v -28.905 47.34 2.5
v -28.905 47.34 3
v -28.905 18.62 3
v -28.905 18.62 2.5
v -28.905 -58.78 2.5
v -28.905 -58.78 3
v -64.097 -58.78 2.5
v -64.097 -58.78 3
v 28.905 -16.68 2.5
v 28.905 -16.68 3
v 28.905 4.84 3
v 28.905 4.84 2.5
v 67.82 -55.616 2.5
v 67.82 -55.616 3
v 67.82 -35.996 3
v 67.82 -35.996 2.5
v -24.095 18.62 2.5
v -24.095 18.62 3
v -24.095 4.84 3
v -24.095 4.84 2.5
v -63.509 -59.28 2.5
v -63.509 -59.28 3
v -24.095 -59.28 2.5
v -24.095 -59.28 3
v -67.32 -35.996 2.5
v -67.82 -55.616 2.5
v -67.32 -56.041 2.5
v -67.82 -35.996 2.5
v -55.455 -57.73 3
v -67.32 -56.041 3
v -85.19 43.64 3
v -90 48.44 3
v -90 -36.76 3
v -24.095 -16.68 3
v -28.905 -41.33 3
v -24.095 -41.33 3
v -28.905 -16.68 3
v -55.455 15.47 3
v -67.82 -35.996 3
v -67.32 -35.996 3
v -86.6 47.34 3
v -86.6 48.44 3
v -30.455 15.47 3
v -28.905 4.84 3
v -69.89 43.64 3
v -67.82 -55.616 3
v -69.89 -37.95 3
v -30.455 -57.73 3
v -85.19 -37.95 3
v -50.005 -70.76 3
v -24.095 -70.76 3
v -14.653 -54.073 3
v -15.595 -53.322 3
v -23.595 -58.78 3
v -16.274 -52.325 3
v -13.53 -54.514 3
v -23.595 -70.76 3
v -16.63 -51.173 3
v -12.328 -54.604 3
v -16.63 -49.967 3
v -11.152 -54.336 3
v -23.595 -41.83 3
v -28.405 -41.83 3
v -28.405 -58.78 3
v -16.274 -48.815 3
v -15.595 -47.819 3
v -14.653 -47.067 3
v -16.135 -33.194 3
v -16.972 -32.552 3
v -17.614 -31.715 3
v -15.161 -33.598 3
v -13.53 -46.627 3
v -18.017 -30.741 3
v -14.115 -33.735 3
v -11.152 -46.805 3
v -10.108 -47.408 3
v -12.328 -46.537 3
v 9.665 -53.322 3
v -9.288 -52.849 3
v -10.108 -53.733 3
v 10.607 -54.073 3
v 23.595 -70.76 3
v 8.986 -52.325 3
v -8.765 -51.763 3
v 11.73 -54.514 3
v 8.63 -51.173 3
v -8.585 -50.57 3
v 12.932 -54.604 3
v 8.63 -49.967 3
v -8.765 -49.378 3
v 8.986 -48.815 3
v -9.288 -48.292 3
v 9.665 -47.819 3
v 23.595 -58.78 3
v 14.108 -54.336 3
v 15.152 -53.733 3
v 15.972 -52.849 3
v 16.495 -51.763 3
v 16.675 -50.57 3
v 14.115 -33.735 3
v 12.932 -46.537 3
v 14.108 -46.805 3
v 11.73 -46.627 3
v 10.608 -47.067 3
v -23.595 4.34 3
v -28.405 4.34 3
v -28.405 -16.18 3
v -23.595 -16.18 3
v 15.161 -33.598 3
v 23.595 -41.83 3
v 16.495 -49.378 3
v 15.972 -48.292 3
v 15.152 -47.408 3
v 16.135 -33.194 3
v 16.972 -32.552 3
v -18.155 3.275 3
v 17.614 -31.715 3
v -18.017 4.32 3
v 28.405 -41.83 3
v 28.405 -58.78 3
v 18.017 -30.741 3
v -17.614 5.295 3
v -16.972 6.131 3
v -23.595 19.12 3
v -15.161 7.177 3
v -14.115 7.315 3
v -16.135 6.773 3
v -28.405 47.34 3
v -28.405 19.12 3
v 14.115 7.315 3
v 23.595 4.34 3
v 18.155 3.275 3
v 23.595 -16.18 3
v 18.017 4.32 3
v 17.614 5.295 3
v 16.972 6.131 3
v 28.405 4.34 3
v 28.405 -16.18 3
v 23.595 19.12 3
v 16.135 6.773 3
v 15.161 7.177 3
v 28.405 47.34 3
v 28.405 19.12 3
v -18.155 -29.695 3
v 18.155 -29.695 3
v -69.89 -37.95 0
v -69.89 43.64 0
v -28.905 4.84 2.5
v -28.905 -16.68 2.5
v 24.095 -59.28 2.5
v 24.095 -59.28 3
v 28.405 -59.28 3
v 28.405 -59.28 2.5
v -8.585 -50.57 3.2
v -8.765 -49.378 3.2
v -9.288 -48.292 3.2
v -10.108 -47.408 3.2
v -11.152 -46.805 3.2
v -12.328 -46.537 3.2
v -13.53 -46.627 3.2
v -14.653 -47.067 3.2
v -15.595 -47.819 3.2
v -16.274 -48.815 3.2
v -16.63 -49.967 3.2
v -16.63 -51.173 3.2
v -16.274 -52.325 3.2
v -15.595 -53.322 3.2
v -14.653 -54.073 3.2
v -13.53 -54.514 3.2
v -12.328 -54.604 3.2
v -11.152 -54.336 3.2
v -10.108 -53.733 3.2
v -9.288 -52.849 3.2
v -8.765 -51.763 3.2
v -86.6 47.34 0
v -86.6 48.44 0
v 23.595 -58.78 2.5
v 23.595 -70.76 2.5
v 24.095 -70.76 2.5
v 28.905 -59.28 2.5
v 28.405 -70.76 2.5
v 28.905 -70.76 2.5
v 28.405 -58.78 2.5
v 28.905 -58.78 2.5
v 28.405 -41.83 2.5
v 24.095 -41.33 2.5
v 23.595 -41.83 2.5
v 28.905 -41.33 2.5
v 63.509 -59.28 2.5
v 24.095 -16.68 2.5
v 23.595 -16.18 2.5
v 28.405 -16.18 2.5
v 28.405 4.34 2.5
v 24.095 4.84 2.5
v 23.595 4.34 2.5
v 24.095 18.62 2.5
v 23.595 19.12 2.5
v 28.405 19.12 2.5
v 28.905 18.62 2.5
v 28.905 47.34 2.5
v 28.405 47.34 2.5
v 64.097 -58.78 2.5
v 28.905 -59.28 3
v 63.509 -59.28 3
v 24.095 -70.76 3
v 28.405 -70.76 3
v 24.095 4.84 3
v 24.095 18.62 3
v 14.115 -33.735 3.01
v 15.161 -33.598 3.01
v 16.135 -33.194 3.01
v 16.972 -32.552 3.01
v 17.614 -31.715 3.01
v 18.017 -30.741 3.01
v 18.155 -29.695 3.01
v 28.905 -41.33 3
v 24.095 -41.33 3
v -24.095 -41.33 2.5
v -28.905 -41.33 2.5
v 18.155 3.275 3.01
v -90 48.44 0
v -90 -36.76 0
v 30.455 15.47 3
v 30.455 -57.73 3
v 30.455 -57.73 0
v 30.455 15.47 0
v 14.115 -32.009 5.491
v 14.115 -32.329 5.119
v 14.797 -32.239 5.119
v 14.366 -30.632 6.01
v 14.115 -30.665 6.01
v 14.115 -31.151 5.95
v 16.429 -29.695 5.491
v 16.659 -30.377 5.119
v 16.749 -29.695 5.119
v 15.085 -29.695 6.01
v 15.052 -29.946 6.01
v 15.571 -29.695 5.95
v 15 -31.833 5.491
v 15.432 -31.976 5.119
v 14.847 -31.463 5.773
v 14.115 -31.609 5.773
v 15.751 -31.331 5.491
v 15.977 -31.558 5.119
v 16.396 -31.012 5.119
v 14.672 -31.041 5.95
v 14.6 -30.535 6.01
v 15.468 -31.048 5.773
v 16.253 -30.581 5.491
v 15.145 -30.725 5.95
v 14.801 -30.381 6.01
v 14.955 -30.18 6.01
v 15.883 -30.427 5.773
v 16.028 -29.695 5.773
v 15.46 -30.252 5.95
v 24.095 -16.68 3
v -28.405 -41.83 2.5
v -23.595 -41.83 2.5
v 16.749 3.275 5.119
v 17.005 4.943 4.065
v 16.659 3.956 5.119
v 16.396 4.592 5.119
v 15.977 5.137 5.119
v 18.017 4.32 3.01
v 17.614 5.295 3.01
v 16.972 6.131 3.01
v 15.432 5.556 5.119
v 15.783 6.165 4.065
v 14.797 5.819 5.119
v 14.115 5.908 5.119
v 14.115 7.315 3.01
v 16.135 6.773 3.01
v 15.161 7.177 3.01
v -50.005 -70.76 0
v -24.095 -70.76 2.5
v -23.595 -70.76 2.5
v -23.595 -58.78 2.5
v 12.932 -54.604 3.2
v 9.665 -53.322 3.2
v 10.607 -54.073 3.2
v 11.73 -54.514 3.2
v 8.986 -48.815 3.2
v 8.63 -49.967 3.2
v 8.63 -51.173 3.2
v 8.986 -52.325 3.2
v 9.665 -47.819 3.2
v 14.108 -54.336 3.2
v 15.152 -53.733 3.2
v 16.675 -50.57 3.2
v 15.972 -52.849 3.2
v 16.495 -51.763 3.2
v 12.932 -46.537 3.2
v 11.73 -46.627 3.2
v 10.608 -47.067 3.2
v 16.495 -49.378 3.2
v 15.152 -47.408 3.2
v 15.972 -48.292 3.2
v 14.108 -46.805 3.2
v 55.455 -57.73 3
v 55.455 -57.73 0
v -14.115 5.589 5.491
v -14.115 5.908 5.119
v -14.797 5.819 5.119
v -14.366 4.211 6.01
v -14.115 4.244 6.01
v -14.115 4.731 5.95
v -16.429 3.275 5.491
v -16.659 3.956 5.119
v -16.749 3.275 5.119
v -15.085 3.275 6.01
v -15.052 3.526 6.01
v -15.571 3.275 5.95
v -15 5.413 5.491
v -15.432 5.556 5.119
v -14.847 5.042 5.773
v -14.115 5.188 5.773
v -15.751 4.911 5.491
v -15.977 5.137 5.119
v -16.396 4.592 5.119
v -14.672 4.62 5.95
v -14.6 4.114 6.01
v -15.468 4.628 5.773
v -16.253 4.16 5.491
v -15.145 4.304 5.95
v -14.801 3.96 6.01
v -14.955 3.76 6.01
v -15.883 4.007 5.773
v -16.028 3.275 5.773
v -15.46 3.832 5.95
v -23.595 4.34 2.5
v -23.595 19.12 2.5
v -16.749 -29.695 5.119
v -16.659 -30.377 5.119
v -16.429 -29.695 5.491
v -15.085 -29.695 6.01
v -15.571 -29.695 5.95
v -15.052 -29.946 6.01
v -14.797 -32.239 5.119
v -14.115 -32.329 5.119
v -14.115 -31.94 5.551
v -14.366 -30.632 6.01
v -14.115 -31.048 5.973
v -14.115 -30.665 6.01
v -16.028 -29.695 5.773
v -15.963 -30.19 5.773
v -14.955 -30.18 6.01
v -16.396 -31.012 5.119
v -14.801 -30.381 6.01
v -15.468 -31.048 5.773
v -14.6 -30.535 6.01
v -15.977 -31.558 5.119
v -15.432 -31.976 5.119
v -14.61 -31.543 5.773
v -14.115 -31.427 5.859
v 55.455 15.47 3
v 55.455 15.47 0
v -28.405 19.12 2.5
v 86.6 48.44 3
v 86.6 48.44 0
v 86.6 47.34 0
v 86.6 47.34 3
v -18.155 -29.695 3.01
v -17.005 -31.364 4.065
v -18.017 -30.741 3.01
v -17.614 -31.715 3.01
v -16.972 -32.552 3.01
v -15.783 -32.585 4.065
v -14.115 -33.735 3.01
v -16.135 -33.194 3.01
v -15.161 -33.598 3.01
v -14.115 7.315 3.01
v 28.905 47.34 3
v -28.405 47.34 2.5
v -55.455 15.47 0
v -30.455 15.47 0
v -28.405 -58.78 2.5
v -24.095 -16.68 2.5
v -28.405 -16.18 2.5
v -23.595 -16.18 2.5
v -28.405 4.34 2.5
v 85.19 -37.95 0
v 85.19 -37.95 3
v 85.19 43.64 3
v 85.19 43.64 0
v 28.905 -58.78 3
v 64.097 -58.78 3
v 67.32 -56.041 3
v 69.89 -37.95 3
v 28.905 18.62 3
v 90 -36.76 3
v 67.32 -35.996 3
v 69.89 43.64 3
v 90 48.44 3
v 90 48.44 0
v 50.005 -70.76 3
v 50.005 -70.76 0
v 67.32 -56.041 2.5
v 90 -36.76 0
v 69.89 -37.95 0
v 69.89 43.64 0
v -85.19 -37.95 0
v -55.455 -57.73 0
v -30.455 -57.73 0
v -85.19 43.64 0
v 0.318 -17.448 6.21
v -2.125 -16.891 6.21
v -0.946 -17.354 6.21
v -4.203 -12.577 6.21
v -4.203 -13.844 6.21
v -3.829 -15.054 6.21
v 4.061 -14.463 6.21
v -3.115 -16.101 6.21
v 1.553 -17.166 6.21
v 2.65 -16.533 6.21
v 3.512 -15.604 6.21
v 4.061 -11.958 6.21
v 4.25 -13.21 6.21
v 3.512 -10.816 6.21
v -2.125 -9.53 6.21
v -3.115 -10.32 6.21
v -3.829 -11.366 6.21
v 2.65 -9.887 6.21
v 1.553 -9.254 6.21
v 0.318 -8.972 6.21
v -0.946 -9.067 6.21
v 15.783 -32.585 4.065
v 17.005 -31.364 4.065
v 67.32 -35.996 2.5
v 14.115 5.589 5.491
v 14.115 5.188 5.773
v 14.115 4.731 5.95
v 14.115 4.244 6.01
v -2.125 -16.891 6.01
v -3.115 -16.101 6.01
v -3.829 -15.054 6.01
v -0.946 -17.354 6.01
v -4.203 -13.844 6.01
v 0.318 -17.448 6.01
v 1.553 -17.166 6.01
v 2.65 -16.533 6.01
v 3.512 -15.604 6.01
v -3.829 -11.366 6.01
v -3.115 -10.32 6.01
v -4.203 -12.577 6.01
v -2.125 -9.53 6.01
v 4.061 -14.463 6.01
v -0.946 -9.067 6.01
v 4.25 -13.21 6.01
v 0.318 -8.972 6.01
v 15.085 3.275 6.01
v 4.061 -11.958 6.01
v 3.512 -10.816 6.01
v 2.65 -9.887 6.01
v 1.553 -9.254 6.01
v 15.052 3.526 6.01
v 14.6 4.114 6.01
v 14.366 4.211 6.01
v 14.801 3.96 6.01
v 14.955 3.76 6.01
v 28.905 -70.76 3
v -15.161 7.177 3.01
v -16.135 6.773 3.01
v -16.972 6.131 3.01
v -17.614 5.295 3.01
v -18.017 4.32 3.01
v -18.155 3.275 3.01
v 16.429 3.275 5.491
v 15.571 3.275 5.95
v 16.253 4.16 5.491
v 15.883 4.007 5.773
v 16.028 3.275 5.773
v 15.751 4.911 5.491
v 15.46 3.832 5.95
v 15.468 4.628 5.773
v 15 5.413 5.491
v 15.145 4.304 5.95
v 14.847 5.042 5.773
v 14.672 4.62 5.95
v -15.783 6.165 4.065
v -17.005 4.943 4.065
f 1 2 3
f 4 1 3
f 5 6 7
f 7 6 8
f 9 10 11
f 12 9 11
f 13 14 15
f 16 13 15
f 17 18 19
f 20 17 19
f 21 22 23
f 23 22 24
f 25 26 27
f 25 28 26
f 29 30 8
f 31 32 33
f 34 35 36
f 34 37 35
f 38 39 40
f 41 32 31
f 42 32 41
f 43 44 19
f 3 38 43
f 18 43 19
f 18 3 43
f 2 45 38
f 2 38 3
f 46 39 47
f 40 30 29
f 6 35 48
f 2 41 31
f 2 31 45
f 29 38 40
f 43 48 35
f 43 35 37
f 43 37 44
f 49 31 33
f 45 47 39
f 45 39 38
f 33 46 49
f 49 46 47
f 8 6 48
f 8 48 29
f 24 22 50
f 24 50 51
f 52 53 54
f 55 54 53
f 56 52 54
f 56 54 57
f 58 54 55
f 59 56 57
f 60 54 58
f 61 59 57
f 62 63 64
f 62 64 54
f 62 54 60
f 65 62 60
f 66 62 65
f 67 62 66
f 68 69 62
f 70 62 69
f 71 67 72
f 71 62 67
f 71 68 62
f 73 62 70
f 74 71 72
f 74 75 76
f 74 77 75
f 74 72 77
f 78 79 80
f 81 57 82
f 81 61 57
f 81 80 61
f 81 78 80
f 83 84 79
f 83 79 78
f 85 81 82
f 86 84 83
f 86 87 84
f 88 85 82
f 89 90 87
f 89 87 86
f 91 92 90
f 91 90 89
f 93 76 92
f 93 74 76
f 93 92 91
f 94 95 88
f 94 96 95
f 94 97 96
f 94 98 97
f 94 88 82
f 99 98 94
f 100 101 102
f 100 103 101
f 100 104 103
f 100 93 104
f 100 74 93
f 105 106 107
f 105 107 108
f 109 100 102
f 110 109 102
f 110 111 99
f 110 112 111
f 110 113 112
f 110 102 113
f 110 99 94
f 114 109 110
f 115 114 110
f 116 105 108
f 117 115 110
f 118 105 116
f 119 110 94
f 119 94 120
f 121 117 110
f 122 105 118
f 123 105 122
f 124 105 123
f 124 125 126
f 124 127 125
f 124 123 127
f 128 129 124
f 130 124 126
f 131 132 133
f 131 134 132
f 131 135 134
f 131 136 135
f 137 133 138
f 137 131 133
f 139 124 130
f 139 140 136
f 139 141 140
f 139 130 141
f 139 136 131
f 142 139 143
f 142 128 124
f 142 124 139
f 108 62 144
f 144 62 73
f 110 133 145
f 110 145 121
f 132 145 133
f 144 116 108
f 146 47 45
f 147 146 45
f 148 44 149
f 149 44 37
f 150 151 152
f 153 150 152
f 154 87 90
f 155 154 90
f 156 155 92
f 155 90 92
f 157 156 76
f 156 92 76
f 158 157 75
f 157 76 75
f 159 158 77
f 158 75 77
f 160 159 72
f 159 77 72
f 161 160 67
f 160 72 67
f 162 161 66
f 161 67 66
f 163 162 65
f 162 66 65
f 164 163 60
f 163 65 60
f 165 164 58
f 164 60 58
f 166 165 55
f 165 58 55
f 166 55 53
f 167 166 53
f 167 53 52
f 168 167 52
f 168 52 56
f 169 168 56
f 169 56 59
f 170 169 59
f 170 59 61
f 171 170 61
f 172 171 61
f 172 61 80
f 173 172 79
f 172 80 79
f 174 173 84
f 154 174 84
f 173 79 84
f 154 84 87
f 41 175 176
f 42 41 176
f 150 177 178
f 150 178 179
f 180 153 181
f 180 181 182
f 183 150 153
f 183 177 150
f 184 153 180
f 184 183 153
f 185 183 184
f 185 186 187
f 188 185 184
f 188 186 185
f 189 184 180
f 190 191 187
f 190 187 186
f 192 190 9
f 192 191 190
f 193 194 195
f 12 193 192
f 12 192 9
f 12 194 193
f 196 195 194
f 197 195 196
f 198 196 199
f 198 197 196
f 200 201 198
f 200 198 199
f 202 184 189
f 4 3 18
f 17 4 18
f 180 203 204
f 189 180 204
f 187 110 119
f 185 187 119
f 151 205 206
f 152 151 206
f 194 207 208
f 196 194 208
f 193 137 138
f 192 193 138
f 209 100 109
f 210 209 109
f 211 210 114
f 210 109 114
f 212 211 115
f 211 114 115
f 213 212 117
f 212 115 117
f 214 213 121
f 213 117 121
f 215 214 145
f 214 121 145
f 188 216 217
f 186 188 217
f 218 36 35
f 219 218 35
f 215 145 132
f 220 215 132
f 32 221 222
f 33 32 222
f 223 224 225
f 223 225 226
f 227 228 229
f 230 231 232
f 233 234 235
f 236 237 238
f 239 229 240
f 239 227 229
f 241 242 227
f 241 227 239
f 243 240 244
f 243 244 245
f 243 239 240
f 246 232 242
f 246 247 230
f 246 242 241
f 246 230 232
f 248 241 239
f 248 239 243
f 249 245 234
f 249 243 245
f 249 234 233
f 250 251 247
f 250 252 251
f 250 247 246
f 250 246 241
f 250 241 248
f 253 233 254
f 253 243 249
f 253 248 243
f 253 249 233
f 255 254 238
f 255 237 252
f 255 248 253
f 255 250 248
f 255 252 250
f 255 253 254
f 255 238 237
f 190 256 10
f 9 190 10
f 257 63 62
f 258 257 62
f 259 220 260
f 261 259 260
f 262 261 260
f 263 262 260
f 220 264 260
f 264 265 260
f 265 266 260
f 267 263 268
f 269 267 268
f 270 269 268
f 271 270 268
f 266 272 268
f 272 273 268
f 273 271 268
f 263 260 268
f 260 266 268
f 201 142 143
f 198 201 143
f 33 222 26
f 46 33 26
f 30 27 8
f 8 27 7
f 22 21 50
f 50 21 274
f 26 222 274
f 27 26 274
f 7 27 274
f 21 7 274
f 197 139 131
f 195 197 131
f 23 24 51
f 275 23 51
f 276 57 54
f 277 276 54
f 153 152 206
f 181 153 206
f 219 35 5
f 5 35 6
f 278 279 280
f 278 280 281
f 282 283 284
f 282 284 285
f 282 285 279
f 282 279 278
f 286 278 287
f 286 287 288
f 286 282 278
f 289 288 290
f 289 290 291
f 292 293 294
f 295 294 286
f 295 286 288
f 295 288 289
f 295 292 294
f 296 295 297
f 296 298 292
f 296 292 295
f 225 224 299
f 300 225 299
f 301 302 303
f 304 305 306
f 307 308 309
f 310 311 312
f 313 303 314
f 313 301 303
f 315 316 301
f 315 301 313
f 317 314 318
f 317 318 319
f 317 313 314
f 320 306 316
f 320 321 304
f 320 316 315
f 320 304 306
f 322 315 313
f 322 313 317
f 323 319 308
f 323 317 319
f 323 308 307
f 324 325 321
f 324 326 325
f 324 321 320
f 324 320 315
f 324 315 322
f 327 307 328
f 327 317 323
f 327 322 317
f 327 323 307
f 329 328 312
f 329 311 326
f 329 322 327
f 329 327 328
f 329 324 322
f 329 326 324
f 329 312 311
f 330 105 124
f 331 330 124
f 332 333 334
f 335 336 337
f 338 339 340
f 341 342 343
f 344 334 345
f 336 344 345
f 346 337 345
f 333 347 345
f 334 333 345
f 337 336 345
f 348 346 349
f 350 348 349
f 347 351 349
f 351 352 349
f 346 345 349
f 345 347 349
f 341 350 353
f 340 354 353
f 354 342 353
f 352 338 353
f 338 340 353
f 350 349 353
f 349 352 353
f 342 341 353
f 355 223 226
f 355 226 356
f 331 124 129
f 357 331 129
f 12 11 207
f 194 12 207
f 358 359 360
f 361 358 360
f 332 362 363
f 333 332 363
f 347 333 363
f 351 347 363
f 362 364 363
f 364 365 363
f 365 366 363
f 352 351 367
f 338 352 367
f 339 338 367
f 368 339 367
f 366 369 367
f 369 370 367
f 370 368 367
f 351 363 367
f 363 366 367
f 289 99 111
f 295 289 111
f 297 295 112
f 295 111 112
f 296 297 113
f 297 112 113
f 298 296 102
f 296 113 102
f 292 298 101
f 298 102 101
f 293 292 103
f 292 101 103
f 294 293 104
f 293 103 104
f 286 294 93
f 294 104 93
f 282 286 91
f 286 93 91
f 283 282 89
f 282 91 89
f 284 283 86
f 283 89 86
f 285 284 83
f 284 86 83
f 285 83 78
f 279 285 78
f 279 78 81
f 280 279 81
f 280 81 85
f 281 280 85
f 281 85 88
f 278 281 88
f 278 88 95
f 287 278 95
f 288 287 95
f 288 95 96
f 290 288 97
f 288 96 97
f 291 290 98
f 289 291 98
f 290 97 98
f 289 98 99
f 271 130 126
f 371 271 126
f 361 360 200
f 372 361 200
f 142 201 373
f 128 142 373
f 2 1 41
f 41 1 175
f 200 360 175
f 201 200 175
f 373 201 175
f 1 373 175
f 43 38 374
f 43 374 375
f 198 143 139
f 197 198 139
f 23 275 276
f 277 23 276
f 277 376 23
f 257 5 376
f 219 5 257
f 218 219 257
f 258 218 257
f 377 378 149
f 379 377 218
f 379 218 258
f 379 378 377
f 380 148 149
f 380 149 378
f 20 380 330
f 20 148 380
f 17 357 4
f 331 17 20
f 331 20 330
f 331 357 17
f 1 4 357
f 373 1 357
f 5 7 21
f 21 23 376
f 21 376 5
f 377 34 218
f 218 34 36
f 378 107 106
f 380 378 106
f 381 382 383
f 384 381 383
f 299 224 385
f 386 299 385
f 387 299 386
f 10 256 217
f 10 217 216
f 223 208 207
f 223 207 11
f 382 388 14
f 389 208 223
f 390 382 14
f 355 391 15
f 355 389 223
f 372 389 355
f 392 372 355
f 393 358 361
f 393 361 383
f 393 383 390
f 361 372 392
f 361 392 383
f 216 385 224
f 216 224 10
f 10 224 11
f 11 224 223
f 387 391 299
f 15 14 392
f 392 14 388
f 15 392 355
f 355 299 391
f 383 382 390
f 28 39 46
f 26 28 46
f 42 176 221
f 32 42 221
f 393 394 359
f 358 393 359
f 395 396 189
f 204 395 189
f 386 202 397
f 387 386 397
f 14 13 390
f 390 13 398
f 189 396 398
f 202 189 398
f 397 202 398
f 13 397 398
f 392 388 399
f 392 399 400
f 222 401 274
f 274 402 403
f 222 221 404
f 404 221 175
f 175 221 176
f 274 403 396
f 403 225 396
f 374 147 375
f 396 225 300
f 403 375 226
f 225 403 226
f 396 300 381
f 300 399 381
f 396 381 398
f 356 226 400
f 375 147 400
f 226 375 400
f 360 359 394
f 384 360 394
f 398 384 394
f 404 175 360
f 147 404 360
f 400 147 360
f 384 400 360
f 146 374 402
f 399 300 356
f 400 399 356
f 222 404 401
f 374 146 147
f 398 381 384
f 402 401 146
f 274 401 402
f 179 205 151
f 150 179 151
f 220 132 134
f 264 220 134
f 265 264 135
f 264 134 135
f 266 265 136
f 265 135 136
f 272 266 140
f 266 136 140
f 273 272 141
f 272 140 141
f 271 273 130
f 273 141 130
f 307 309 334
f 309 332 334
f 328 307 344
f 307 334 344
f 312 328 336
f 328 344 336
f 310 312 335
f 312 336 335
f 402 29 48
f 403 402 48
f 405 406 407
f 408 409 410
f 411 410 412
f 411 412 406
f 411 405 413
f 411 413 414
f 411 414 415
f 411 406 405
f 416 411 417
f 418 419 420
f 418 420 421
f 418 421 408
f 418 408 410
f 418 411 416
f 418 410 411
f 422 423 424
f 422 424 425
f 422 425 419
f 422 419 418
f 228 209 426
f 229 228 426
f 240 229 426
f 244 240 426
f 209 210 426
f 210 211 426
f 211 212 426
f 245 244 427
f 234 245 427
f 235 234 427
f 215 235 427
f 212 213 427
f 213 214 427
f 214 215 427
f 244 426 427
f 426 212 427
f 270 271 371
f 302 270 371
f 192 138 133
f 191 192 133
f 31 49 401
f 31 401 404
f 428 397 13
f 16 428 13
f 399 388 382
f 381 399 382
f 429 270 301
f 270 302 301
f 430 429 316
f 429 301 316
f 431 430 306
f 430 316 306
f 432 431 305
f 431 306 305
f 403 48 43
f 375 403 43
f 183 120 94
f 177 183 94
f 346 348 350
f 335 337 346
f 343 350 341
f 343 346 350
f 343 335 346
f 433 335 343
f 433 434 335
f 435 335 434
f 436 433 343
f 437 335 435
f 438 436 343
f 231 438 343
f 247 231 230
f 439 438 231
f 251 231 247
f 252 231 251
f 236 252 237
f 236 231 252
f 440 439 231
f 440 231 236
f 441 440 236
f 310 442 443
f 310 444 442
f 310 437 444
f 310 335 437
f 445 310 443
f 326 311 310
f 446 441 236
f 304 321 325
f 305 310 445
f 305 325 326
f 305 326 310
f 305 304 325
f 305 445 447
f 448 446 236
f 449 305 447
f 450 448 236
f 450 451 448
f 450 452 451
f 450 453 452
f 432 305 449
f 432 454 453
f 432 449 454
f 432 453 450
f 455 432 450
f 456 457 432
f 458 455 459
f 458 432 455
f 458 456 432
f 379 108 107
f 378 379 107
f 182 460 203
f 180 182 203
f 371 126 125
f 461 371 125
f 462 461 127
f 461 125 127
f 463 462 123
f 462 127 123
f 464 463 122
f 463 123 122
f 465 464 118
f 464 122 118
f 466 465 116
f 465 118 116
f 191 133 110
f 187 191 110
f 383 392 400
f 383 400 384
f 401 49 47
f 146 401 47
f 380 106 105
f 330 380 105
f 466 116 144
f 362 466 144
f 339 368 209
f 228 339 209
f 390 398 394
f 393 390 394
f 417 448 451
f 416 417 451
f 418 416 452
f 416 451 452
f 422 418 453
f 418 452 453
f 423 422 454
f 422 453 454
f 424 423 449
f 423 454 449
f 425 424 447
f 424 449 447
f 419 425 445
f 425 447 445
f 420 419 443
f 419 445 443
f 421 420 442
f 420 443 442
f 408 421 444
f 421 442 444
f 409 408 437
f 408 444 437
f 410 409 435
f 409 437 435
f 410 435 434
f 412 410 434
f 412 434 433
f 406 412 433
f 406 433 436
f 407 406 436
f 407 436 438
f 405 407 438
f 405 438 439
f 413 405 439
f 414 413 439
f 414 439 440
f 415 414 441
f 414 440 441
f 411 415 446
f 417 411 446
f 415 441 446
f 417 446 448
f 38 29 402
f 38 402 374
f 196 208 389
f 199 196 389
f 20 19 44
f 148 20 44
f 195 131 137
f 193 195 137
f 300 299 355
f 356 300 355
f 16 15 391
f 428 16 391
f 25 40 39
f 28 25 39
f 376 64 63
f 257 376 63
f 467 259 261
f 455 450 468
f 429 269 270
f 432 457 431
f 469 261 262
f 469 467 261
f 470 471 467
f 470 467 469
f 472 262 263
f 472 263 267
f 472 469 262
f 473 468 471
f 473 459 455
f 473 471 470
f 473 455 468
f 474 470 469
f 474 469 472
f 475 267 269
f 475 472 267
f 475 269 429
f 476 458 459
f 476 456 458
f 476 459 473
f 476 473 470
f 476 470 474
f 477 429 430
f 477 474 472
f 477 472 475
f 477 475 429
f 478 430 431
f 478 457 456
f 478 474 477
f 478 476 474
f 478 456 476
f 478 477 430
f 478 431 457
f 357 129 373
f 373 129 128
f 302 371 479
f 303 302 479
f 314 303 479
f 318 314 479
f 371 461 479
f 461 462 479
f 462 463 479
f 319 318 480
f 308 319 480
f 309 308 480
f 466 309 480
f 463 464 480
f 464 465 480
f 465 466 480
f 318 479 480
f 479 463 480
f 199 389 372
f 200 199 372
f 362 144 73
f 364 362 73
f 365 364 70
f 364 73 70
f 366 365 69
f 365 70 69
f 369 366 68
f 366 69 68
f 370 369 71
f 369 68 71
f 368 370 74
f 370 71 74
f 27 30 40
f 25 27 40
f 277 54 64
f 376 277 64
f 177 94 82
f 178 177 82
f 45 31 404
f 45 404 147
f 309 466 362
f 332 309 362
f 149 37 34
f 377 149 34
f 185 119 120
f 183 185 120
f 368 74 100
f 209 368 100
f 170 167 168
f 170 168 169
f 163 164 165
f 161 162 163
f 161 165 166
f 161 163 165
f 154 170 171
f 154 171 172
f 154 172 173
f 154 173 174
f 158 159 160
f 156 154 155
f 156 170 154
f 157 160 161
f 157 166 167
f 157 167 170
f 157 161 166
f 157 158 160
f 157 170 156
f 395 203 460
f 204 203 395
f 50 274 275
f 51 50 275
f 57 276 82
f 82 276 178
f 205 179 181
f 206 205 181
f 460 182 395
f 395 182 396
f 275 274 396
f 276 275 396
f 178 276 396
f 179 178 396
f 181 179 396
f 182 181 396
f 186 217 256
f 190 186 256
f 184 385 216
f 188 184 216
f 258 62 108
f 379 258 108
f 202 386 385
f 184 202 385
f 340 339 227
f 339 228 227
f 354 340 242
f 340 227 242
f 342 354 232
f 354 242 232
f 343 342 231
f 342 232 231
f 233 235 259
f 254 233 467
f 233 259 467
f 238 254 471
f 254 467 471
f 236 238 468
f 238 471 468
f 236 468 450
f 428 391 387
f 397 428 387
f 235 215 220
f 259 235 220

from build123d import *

# Parameters (mm, degrees)
F1_DEPTH  = 3
F3_DEPTH  = 0.5
F5_DEPTH  = 3.01
F6_SIZE2  = 3
F6_SIZE   = 2
F7_R      = 2
F8_R      = 4.25
F9_DEPTH  = 0.2
F10_R     = 4.045
F11_DEPTH = 0.2
F12_W     = 15.3
F12_H     = 81.59
F12_W_2   = 25
F12_H_2   = 73.2
F13_DEPTH = 25


with BuildPart() as f1:
    # F0 (on Top) → F1 (new body)
    with BuildSketch(Plane.XY):
        Polygon((-86.6, 48.4397485852), (-90, 48.4397485852), (-90, -36.7602514148), (-50.005, -70.7602514148), (50.005, -70.7602514148), (90, -36.7602514148), (90, 48.4397485852), (86.6, 48.4397485852), (86.6, 47.3397485852), (-86.6, 47.3397485852), align=None)
    extrude(amount=F1_DEPTH)

    # F2 (on face) → F3 (cut)
    with BuildSketch(Plane.XY.offset(3)):
        Polygon((28.905, 18.6197485852), (28.905, 47.3397485852), (28.405, 47.3397485852), (28.405, 19.1197485852), (23.595, 19.1197485852), (23.595, 4.3397485852), (28.405, 4.3397485852), (28.405, -16.1802514148), (23.595, -16.1802514148), (23.595, -41.8302514148), (28.405, -41.8302514148), (28.405, -58.7802514148), (23.595, -58.7802514148), (23.595, -70.7602514148), (24.095, -70.7602514148), (24.095, -59.2802514148), (28.405, -59.2802514148), (28.405, -71.6557353735), (28.905, -71.7005729675), (28.905, -59.2802514148), (67.82, -59.2802514148), (67.82, -35.9962806106), (67.32, -35.9962806106), (67.32, -58.7802514148), (28.905, -58.7802514148), (28.905, -41.3302514148), (24.095, -41.3302514148), (24.095, -16.6802514148), (28.905, -16.6802514148), (28.905, 4.8397485852), (24.095, 4.8397485852), (24.095, 18.6197485852), align=None)
        Polygon((-28.405, 19.1197485852), (-28.405, 47.3397485852), (-28.905, 47.3397485852), (-28.905, 18.6197485852), (-24.095, 18.6197485852), (-24.095, 4.8397485852), (-28.905, 4.8397485852), (-28.905, -16.6802514148), (-24.095, -16.6802514148), (-24.095, -41.3302514148), (-28.905, -41.3302514148), (-28.905, -58.7802514148), (-28.905, -59.2802514148), (-28.405, -59.2802514148), (-24.095, -59.2802514148), (-24.095, -70.7602514148), (-23.595, -70.7602514148), (-23.595, -58.7802514148), (-28.405, -58.7802514148), (-28.405, -41.8302514148), (-23.595, -41.8302514148), (-23.595, -16.1802514148), (-28.405, -16.1802514148), (-28.405, 4.3397485852), (-23.595, 4.3397485852), (-23.595, 19.1197485852), align=None)
        Polygon((-28.905, -59.2802514148), (-28.905, -58.7802514148), (-67.32, -58.7802514148), (-67.32, -35.9962806106), (-67.82, -35.9962806106), (-67.82, -59.2802514148), align=None)
    extrude(amount=-F3_DEPTH, mode=Mode.SUBTRACT)

    # F4 (on face) → F5 (join)
    with BuildSketch(Plane.XY.offset(3)):
        with BuildLine():
            Line((14.115, 7.3147485852), (-14.115, 7.3147485852))
            ThreePointArc((-14.115, 7.3147485852), (-16.971711396, 6.1314599812), (-18.155, 3.2747485852))
            Line((-18.155, 3.2747485852), (-18.155, -29.6952514148))
            ThreePointArc((-18.155, -29.6952514148), (-16.971711396, -32.5519628108), (-14.115, -33.7352514148))
            Line((-14.115, -33.7352514148), (14.115, -33.7352514148))
            ThreePointArc((14.115, -33.7352514148), (16.971711396, -32.5519628108), (18.155, -29.6952514148))
            Line((18.155, -29.6952514148), (18.155, 3.2747485852))
            ThreePointArc((18.155, 3.2747485852), (16.971711396, 6.1314599812), (14.115, 7.3147485852))
        make_face()
    extrude(amount=F5_DEPTH)

    # F6
    f6_edges = [f1.edges().sort_by_distance(p)[0] for p in [
        (-18.155, -13.210251, 6.01),
    ]]
    f6_side = f1.faces().sort_by_distance((0, -13.210251, 6.01))[0]
    chamfer(f6_edges, length=F6_SIZE, length2=F6_SIZE2, reference=f6_side)

    # F7
    f7_edges = [f1.edges().sort_by_distance(p)[0] for p in [
        (15.557498, 4.717246, 6.01),
    ]]
    fillet(f7_edges, radius=F7_R)

    # F8 (on face) → F9 (join)
    with BuildSketch(Plane.XY.offset(6.01)):
        with Locations((0, -13.2102514148)):
            Circle(F8_R)
    extrude(amount=F9_DEPTH)

    # F10 (on face) → F11 (join)
    with BuildSketch(Plane.XY.offset(3)):
        with Locations((-12.63, -50.5702514148)):
            Circle(F10_R)
        with Locations((12.63, -50.5702514148)):
            Circle(F10_R)
    extrude(amount=F11_DEPTH)

    # F12 (on face) → F13 (cut)
    with BuildSketch(Plane.XY.offset(3)):
        with Locations((-77.54, 2.8447485852)):
            Rectangle(F12_W, F12_H)
        with Locations((77.54, 2.8447485852)):
            Rectangle(F12_W, F12_H)
        with Locations((-42.955, -21.1302514148)):
            Rectangle(F12_W_2, F12_H_2)
        with Locations((42.955, -21.1302514148)):
            Rectangle(F12_W_2, F12_H_2)
    extrude(amount=-F13_DEPTH, mode=Mode.SUBTRACT)


solid = f1.part
